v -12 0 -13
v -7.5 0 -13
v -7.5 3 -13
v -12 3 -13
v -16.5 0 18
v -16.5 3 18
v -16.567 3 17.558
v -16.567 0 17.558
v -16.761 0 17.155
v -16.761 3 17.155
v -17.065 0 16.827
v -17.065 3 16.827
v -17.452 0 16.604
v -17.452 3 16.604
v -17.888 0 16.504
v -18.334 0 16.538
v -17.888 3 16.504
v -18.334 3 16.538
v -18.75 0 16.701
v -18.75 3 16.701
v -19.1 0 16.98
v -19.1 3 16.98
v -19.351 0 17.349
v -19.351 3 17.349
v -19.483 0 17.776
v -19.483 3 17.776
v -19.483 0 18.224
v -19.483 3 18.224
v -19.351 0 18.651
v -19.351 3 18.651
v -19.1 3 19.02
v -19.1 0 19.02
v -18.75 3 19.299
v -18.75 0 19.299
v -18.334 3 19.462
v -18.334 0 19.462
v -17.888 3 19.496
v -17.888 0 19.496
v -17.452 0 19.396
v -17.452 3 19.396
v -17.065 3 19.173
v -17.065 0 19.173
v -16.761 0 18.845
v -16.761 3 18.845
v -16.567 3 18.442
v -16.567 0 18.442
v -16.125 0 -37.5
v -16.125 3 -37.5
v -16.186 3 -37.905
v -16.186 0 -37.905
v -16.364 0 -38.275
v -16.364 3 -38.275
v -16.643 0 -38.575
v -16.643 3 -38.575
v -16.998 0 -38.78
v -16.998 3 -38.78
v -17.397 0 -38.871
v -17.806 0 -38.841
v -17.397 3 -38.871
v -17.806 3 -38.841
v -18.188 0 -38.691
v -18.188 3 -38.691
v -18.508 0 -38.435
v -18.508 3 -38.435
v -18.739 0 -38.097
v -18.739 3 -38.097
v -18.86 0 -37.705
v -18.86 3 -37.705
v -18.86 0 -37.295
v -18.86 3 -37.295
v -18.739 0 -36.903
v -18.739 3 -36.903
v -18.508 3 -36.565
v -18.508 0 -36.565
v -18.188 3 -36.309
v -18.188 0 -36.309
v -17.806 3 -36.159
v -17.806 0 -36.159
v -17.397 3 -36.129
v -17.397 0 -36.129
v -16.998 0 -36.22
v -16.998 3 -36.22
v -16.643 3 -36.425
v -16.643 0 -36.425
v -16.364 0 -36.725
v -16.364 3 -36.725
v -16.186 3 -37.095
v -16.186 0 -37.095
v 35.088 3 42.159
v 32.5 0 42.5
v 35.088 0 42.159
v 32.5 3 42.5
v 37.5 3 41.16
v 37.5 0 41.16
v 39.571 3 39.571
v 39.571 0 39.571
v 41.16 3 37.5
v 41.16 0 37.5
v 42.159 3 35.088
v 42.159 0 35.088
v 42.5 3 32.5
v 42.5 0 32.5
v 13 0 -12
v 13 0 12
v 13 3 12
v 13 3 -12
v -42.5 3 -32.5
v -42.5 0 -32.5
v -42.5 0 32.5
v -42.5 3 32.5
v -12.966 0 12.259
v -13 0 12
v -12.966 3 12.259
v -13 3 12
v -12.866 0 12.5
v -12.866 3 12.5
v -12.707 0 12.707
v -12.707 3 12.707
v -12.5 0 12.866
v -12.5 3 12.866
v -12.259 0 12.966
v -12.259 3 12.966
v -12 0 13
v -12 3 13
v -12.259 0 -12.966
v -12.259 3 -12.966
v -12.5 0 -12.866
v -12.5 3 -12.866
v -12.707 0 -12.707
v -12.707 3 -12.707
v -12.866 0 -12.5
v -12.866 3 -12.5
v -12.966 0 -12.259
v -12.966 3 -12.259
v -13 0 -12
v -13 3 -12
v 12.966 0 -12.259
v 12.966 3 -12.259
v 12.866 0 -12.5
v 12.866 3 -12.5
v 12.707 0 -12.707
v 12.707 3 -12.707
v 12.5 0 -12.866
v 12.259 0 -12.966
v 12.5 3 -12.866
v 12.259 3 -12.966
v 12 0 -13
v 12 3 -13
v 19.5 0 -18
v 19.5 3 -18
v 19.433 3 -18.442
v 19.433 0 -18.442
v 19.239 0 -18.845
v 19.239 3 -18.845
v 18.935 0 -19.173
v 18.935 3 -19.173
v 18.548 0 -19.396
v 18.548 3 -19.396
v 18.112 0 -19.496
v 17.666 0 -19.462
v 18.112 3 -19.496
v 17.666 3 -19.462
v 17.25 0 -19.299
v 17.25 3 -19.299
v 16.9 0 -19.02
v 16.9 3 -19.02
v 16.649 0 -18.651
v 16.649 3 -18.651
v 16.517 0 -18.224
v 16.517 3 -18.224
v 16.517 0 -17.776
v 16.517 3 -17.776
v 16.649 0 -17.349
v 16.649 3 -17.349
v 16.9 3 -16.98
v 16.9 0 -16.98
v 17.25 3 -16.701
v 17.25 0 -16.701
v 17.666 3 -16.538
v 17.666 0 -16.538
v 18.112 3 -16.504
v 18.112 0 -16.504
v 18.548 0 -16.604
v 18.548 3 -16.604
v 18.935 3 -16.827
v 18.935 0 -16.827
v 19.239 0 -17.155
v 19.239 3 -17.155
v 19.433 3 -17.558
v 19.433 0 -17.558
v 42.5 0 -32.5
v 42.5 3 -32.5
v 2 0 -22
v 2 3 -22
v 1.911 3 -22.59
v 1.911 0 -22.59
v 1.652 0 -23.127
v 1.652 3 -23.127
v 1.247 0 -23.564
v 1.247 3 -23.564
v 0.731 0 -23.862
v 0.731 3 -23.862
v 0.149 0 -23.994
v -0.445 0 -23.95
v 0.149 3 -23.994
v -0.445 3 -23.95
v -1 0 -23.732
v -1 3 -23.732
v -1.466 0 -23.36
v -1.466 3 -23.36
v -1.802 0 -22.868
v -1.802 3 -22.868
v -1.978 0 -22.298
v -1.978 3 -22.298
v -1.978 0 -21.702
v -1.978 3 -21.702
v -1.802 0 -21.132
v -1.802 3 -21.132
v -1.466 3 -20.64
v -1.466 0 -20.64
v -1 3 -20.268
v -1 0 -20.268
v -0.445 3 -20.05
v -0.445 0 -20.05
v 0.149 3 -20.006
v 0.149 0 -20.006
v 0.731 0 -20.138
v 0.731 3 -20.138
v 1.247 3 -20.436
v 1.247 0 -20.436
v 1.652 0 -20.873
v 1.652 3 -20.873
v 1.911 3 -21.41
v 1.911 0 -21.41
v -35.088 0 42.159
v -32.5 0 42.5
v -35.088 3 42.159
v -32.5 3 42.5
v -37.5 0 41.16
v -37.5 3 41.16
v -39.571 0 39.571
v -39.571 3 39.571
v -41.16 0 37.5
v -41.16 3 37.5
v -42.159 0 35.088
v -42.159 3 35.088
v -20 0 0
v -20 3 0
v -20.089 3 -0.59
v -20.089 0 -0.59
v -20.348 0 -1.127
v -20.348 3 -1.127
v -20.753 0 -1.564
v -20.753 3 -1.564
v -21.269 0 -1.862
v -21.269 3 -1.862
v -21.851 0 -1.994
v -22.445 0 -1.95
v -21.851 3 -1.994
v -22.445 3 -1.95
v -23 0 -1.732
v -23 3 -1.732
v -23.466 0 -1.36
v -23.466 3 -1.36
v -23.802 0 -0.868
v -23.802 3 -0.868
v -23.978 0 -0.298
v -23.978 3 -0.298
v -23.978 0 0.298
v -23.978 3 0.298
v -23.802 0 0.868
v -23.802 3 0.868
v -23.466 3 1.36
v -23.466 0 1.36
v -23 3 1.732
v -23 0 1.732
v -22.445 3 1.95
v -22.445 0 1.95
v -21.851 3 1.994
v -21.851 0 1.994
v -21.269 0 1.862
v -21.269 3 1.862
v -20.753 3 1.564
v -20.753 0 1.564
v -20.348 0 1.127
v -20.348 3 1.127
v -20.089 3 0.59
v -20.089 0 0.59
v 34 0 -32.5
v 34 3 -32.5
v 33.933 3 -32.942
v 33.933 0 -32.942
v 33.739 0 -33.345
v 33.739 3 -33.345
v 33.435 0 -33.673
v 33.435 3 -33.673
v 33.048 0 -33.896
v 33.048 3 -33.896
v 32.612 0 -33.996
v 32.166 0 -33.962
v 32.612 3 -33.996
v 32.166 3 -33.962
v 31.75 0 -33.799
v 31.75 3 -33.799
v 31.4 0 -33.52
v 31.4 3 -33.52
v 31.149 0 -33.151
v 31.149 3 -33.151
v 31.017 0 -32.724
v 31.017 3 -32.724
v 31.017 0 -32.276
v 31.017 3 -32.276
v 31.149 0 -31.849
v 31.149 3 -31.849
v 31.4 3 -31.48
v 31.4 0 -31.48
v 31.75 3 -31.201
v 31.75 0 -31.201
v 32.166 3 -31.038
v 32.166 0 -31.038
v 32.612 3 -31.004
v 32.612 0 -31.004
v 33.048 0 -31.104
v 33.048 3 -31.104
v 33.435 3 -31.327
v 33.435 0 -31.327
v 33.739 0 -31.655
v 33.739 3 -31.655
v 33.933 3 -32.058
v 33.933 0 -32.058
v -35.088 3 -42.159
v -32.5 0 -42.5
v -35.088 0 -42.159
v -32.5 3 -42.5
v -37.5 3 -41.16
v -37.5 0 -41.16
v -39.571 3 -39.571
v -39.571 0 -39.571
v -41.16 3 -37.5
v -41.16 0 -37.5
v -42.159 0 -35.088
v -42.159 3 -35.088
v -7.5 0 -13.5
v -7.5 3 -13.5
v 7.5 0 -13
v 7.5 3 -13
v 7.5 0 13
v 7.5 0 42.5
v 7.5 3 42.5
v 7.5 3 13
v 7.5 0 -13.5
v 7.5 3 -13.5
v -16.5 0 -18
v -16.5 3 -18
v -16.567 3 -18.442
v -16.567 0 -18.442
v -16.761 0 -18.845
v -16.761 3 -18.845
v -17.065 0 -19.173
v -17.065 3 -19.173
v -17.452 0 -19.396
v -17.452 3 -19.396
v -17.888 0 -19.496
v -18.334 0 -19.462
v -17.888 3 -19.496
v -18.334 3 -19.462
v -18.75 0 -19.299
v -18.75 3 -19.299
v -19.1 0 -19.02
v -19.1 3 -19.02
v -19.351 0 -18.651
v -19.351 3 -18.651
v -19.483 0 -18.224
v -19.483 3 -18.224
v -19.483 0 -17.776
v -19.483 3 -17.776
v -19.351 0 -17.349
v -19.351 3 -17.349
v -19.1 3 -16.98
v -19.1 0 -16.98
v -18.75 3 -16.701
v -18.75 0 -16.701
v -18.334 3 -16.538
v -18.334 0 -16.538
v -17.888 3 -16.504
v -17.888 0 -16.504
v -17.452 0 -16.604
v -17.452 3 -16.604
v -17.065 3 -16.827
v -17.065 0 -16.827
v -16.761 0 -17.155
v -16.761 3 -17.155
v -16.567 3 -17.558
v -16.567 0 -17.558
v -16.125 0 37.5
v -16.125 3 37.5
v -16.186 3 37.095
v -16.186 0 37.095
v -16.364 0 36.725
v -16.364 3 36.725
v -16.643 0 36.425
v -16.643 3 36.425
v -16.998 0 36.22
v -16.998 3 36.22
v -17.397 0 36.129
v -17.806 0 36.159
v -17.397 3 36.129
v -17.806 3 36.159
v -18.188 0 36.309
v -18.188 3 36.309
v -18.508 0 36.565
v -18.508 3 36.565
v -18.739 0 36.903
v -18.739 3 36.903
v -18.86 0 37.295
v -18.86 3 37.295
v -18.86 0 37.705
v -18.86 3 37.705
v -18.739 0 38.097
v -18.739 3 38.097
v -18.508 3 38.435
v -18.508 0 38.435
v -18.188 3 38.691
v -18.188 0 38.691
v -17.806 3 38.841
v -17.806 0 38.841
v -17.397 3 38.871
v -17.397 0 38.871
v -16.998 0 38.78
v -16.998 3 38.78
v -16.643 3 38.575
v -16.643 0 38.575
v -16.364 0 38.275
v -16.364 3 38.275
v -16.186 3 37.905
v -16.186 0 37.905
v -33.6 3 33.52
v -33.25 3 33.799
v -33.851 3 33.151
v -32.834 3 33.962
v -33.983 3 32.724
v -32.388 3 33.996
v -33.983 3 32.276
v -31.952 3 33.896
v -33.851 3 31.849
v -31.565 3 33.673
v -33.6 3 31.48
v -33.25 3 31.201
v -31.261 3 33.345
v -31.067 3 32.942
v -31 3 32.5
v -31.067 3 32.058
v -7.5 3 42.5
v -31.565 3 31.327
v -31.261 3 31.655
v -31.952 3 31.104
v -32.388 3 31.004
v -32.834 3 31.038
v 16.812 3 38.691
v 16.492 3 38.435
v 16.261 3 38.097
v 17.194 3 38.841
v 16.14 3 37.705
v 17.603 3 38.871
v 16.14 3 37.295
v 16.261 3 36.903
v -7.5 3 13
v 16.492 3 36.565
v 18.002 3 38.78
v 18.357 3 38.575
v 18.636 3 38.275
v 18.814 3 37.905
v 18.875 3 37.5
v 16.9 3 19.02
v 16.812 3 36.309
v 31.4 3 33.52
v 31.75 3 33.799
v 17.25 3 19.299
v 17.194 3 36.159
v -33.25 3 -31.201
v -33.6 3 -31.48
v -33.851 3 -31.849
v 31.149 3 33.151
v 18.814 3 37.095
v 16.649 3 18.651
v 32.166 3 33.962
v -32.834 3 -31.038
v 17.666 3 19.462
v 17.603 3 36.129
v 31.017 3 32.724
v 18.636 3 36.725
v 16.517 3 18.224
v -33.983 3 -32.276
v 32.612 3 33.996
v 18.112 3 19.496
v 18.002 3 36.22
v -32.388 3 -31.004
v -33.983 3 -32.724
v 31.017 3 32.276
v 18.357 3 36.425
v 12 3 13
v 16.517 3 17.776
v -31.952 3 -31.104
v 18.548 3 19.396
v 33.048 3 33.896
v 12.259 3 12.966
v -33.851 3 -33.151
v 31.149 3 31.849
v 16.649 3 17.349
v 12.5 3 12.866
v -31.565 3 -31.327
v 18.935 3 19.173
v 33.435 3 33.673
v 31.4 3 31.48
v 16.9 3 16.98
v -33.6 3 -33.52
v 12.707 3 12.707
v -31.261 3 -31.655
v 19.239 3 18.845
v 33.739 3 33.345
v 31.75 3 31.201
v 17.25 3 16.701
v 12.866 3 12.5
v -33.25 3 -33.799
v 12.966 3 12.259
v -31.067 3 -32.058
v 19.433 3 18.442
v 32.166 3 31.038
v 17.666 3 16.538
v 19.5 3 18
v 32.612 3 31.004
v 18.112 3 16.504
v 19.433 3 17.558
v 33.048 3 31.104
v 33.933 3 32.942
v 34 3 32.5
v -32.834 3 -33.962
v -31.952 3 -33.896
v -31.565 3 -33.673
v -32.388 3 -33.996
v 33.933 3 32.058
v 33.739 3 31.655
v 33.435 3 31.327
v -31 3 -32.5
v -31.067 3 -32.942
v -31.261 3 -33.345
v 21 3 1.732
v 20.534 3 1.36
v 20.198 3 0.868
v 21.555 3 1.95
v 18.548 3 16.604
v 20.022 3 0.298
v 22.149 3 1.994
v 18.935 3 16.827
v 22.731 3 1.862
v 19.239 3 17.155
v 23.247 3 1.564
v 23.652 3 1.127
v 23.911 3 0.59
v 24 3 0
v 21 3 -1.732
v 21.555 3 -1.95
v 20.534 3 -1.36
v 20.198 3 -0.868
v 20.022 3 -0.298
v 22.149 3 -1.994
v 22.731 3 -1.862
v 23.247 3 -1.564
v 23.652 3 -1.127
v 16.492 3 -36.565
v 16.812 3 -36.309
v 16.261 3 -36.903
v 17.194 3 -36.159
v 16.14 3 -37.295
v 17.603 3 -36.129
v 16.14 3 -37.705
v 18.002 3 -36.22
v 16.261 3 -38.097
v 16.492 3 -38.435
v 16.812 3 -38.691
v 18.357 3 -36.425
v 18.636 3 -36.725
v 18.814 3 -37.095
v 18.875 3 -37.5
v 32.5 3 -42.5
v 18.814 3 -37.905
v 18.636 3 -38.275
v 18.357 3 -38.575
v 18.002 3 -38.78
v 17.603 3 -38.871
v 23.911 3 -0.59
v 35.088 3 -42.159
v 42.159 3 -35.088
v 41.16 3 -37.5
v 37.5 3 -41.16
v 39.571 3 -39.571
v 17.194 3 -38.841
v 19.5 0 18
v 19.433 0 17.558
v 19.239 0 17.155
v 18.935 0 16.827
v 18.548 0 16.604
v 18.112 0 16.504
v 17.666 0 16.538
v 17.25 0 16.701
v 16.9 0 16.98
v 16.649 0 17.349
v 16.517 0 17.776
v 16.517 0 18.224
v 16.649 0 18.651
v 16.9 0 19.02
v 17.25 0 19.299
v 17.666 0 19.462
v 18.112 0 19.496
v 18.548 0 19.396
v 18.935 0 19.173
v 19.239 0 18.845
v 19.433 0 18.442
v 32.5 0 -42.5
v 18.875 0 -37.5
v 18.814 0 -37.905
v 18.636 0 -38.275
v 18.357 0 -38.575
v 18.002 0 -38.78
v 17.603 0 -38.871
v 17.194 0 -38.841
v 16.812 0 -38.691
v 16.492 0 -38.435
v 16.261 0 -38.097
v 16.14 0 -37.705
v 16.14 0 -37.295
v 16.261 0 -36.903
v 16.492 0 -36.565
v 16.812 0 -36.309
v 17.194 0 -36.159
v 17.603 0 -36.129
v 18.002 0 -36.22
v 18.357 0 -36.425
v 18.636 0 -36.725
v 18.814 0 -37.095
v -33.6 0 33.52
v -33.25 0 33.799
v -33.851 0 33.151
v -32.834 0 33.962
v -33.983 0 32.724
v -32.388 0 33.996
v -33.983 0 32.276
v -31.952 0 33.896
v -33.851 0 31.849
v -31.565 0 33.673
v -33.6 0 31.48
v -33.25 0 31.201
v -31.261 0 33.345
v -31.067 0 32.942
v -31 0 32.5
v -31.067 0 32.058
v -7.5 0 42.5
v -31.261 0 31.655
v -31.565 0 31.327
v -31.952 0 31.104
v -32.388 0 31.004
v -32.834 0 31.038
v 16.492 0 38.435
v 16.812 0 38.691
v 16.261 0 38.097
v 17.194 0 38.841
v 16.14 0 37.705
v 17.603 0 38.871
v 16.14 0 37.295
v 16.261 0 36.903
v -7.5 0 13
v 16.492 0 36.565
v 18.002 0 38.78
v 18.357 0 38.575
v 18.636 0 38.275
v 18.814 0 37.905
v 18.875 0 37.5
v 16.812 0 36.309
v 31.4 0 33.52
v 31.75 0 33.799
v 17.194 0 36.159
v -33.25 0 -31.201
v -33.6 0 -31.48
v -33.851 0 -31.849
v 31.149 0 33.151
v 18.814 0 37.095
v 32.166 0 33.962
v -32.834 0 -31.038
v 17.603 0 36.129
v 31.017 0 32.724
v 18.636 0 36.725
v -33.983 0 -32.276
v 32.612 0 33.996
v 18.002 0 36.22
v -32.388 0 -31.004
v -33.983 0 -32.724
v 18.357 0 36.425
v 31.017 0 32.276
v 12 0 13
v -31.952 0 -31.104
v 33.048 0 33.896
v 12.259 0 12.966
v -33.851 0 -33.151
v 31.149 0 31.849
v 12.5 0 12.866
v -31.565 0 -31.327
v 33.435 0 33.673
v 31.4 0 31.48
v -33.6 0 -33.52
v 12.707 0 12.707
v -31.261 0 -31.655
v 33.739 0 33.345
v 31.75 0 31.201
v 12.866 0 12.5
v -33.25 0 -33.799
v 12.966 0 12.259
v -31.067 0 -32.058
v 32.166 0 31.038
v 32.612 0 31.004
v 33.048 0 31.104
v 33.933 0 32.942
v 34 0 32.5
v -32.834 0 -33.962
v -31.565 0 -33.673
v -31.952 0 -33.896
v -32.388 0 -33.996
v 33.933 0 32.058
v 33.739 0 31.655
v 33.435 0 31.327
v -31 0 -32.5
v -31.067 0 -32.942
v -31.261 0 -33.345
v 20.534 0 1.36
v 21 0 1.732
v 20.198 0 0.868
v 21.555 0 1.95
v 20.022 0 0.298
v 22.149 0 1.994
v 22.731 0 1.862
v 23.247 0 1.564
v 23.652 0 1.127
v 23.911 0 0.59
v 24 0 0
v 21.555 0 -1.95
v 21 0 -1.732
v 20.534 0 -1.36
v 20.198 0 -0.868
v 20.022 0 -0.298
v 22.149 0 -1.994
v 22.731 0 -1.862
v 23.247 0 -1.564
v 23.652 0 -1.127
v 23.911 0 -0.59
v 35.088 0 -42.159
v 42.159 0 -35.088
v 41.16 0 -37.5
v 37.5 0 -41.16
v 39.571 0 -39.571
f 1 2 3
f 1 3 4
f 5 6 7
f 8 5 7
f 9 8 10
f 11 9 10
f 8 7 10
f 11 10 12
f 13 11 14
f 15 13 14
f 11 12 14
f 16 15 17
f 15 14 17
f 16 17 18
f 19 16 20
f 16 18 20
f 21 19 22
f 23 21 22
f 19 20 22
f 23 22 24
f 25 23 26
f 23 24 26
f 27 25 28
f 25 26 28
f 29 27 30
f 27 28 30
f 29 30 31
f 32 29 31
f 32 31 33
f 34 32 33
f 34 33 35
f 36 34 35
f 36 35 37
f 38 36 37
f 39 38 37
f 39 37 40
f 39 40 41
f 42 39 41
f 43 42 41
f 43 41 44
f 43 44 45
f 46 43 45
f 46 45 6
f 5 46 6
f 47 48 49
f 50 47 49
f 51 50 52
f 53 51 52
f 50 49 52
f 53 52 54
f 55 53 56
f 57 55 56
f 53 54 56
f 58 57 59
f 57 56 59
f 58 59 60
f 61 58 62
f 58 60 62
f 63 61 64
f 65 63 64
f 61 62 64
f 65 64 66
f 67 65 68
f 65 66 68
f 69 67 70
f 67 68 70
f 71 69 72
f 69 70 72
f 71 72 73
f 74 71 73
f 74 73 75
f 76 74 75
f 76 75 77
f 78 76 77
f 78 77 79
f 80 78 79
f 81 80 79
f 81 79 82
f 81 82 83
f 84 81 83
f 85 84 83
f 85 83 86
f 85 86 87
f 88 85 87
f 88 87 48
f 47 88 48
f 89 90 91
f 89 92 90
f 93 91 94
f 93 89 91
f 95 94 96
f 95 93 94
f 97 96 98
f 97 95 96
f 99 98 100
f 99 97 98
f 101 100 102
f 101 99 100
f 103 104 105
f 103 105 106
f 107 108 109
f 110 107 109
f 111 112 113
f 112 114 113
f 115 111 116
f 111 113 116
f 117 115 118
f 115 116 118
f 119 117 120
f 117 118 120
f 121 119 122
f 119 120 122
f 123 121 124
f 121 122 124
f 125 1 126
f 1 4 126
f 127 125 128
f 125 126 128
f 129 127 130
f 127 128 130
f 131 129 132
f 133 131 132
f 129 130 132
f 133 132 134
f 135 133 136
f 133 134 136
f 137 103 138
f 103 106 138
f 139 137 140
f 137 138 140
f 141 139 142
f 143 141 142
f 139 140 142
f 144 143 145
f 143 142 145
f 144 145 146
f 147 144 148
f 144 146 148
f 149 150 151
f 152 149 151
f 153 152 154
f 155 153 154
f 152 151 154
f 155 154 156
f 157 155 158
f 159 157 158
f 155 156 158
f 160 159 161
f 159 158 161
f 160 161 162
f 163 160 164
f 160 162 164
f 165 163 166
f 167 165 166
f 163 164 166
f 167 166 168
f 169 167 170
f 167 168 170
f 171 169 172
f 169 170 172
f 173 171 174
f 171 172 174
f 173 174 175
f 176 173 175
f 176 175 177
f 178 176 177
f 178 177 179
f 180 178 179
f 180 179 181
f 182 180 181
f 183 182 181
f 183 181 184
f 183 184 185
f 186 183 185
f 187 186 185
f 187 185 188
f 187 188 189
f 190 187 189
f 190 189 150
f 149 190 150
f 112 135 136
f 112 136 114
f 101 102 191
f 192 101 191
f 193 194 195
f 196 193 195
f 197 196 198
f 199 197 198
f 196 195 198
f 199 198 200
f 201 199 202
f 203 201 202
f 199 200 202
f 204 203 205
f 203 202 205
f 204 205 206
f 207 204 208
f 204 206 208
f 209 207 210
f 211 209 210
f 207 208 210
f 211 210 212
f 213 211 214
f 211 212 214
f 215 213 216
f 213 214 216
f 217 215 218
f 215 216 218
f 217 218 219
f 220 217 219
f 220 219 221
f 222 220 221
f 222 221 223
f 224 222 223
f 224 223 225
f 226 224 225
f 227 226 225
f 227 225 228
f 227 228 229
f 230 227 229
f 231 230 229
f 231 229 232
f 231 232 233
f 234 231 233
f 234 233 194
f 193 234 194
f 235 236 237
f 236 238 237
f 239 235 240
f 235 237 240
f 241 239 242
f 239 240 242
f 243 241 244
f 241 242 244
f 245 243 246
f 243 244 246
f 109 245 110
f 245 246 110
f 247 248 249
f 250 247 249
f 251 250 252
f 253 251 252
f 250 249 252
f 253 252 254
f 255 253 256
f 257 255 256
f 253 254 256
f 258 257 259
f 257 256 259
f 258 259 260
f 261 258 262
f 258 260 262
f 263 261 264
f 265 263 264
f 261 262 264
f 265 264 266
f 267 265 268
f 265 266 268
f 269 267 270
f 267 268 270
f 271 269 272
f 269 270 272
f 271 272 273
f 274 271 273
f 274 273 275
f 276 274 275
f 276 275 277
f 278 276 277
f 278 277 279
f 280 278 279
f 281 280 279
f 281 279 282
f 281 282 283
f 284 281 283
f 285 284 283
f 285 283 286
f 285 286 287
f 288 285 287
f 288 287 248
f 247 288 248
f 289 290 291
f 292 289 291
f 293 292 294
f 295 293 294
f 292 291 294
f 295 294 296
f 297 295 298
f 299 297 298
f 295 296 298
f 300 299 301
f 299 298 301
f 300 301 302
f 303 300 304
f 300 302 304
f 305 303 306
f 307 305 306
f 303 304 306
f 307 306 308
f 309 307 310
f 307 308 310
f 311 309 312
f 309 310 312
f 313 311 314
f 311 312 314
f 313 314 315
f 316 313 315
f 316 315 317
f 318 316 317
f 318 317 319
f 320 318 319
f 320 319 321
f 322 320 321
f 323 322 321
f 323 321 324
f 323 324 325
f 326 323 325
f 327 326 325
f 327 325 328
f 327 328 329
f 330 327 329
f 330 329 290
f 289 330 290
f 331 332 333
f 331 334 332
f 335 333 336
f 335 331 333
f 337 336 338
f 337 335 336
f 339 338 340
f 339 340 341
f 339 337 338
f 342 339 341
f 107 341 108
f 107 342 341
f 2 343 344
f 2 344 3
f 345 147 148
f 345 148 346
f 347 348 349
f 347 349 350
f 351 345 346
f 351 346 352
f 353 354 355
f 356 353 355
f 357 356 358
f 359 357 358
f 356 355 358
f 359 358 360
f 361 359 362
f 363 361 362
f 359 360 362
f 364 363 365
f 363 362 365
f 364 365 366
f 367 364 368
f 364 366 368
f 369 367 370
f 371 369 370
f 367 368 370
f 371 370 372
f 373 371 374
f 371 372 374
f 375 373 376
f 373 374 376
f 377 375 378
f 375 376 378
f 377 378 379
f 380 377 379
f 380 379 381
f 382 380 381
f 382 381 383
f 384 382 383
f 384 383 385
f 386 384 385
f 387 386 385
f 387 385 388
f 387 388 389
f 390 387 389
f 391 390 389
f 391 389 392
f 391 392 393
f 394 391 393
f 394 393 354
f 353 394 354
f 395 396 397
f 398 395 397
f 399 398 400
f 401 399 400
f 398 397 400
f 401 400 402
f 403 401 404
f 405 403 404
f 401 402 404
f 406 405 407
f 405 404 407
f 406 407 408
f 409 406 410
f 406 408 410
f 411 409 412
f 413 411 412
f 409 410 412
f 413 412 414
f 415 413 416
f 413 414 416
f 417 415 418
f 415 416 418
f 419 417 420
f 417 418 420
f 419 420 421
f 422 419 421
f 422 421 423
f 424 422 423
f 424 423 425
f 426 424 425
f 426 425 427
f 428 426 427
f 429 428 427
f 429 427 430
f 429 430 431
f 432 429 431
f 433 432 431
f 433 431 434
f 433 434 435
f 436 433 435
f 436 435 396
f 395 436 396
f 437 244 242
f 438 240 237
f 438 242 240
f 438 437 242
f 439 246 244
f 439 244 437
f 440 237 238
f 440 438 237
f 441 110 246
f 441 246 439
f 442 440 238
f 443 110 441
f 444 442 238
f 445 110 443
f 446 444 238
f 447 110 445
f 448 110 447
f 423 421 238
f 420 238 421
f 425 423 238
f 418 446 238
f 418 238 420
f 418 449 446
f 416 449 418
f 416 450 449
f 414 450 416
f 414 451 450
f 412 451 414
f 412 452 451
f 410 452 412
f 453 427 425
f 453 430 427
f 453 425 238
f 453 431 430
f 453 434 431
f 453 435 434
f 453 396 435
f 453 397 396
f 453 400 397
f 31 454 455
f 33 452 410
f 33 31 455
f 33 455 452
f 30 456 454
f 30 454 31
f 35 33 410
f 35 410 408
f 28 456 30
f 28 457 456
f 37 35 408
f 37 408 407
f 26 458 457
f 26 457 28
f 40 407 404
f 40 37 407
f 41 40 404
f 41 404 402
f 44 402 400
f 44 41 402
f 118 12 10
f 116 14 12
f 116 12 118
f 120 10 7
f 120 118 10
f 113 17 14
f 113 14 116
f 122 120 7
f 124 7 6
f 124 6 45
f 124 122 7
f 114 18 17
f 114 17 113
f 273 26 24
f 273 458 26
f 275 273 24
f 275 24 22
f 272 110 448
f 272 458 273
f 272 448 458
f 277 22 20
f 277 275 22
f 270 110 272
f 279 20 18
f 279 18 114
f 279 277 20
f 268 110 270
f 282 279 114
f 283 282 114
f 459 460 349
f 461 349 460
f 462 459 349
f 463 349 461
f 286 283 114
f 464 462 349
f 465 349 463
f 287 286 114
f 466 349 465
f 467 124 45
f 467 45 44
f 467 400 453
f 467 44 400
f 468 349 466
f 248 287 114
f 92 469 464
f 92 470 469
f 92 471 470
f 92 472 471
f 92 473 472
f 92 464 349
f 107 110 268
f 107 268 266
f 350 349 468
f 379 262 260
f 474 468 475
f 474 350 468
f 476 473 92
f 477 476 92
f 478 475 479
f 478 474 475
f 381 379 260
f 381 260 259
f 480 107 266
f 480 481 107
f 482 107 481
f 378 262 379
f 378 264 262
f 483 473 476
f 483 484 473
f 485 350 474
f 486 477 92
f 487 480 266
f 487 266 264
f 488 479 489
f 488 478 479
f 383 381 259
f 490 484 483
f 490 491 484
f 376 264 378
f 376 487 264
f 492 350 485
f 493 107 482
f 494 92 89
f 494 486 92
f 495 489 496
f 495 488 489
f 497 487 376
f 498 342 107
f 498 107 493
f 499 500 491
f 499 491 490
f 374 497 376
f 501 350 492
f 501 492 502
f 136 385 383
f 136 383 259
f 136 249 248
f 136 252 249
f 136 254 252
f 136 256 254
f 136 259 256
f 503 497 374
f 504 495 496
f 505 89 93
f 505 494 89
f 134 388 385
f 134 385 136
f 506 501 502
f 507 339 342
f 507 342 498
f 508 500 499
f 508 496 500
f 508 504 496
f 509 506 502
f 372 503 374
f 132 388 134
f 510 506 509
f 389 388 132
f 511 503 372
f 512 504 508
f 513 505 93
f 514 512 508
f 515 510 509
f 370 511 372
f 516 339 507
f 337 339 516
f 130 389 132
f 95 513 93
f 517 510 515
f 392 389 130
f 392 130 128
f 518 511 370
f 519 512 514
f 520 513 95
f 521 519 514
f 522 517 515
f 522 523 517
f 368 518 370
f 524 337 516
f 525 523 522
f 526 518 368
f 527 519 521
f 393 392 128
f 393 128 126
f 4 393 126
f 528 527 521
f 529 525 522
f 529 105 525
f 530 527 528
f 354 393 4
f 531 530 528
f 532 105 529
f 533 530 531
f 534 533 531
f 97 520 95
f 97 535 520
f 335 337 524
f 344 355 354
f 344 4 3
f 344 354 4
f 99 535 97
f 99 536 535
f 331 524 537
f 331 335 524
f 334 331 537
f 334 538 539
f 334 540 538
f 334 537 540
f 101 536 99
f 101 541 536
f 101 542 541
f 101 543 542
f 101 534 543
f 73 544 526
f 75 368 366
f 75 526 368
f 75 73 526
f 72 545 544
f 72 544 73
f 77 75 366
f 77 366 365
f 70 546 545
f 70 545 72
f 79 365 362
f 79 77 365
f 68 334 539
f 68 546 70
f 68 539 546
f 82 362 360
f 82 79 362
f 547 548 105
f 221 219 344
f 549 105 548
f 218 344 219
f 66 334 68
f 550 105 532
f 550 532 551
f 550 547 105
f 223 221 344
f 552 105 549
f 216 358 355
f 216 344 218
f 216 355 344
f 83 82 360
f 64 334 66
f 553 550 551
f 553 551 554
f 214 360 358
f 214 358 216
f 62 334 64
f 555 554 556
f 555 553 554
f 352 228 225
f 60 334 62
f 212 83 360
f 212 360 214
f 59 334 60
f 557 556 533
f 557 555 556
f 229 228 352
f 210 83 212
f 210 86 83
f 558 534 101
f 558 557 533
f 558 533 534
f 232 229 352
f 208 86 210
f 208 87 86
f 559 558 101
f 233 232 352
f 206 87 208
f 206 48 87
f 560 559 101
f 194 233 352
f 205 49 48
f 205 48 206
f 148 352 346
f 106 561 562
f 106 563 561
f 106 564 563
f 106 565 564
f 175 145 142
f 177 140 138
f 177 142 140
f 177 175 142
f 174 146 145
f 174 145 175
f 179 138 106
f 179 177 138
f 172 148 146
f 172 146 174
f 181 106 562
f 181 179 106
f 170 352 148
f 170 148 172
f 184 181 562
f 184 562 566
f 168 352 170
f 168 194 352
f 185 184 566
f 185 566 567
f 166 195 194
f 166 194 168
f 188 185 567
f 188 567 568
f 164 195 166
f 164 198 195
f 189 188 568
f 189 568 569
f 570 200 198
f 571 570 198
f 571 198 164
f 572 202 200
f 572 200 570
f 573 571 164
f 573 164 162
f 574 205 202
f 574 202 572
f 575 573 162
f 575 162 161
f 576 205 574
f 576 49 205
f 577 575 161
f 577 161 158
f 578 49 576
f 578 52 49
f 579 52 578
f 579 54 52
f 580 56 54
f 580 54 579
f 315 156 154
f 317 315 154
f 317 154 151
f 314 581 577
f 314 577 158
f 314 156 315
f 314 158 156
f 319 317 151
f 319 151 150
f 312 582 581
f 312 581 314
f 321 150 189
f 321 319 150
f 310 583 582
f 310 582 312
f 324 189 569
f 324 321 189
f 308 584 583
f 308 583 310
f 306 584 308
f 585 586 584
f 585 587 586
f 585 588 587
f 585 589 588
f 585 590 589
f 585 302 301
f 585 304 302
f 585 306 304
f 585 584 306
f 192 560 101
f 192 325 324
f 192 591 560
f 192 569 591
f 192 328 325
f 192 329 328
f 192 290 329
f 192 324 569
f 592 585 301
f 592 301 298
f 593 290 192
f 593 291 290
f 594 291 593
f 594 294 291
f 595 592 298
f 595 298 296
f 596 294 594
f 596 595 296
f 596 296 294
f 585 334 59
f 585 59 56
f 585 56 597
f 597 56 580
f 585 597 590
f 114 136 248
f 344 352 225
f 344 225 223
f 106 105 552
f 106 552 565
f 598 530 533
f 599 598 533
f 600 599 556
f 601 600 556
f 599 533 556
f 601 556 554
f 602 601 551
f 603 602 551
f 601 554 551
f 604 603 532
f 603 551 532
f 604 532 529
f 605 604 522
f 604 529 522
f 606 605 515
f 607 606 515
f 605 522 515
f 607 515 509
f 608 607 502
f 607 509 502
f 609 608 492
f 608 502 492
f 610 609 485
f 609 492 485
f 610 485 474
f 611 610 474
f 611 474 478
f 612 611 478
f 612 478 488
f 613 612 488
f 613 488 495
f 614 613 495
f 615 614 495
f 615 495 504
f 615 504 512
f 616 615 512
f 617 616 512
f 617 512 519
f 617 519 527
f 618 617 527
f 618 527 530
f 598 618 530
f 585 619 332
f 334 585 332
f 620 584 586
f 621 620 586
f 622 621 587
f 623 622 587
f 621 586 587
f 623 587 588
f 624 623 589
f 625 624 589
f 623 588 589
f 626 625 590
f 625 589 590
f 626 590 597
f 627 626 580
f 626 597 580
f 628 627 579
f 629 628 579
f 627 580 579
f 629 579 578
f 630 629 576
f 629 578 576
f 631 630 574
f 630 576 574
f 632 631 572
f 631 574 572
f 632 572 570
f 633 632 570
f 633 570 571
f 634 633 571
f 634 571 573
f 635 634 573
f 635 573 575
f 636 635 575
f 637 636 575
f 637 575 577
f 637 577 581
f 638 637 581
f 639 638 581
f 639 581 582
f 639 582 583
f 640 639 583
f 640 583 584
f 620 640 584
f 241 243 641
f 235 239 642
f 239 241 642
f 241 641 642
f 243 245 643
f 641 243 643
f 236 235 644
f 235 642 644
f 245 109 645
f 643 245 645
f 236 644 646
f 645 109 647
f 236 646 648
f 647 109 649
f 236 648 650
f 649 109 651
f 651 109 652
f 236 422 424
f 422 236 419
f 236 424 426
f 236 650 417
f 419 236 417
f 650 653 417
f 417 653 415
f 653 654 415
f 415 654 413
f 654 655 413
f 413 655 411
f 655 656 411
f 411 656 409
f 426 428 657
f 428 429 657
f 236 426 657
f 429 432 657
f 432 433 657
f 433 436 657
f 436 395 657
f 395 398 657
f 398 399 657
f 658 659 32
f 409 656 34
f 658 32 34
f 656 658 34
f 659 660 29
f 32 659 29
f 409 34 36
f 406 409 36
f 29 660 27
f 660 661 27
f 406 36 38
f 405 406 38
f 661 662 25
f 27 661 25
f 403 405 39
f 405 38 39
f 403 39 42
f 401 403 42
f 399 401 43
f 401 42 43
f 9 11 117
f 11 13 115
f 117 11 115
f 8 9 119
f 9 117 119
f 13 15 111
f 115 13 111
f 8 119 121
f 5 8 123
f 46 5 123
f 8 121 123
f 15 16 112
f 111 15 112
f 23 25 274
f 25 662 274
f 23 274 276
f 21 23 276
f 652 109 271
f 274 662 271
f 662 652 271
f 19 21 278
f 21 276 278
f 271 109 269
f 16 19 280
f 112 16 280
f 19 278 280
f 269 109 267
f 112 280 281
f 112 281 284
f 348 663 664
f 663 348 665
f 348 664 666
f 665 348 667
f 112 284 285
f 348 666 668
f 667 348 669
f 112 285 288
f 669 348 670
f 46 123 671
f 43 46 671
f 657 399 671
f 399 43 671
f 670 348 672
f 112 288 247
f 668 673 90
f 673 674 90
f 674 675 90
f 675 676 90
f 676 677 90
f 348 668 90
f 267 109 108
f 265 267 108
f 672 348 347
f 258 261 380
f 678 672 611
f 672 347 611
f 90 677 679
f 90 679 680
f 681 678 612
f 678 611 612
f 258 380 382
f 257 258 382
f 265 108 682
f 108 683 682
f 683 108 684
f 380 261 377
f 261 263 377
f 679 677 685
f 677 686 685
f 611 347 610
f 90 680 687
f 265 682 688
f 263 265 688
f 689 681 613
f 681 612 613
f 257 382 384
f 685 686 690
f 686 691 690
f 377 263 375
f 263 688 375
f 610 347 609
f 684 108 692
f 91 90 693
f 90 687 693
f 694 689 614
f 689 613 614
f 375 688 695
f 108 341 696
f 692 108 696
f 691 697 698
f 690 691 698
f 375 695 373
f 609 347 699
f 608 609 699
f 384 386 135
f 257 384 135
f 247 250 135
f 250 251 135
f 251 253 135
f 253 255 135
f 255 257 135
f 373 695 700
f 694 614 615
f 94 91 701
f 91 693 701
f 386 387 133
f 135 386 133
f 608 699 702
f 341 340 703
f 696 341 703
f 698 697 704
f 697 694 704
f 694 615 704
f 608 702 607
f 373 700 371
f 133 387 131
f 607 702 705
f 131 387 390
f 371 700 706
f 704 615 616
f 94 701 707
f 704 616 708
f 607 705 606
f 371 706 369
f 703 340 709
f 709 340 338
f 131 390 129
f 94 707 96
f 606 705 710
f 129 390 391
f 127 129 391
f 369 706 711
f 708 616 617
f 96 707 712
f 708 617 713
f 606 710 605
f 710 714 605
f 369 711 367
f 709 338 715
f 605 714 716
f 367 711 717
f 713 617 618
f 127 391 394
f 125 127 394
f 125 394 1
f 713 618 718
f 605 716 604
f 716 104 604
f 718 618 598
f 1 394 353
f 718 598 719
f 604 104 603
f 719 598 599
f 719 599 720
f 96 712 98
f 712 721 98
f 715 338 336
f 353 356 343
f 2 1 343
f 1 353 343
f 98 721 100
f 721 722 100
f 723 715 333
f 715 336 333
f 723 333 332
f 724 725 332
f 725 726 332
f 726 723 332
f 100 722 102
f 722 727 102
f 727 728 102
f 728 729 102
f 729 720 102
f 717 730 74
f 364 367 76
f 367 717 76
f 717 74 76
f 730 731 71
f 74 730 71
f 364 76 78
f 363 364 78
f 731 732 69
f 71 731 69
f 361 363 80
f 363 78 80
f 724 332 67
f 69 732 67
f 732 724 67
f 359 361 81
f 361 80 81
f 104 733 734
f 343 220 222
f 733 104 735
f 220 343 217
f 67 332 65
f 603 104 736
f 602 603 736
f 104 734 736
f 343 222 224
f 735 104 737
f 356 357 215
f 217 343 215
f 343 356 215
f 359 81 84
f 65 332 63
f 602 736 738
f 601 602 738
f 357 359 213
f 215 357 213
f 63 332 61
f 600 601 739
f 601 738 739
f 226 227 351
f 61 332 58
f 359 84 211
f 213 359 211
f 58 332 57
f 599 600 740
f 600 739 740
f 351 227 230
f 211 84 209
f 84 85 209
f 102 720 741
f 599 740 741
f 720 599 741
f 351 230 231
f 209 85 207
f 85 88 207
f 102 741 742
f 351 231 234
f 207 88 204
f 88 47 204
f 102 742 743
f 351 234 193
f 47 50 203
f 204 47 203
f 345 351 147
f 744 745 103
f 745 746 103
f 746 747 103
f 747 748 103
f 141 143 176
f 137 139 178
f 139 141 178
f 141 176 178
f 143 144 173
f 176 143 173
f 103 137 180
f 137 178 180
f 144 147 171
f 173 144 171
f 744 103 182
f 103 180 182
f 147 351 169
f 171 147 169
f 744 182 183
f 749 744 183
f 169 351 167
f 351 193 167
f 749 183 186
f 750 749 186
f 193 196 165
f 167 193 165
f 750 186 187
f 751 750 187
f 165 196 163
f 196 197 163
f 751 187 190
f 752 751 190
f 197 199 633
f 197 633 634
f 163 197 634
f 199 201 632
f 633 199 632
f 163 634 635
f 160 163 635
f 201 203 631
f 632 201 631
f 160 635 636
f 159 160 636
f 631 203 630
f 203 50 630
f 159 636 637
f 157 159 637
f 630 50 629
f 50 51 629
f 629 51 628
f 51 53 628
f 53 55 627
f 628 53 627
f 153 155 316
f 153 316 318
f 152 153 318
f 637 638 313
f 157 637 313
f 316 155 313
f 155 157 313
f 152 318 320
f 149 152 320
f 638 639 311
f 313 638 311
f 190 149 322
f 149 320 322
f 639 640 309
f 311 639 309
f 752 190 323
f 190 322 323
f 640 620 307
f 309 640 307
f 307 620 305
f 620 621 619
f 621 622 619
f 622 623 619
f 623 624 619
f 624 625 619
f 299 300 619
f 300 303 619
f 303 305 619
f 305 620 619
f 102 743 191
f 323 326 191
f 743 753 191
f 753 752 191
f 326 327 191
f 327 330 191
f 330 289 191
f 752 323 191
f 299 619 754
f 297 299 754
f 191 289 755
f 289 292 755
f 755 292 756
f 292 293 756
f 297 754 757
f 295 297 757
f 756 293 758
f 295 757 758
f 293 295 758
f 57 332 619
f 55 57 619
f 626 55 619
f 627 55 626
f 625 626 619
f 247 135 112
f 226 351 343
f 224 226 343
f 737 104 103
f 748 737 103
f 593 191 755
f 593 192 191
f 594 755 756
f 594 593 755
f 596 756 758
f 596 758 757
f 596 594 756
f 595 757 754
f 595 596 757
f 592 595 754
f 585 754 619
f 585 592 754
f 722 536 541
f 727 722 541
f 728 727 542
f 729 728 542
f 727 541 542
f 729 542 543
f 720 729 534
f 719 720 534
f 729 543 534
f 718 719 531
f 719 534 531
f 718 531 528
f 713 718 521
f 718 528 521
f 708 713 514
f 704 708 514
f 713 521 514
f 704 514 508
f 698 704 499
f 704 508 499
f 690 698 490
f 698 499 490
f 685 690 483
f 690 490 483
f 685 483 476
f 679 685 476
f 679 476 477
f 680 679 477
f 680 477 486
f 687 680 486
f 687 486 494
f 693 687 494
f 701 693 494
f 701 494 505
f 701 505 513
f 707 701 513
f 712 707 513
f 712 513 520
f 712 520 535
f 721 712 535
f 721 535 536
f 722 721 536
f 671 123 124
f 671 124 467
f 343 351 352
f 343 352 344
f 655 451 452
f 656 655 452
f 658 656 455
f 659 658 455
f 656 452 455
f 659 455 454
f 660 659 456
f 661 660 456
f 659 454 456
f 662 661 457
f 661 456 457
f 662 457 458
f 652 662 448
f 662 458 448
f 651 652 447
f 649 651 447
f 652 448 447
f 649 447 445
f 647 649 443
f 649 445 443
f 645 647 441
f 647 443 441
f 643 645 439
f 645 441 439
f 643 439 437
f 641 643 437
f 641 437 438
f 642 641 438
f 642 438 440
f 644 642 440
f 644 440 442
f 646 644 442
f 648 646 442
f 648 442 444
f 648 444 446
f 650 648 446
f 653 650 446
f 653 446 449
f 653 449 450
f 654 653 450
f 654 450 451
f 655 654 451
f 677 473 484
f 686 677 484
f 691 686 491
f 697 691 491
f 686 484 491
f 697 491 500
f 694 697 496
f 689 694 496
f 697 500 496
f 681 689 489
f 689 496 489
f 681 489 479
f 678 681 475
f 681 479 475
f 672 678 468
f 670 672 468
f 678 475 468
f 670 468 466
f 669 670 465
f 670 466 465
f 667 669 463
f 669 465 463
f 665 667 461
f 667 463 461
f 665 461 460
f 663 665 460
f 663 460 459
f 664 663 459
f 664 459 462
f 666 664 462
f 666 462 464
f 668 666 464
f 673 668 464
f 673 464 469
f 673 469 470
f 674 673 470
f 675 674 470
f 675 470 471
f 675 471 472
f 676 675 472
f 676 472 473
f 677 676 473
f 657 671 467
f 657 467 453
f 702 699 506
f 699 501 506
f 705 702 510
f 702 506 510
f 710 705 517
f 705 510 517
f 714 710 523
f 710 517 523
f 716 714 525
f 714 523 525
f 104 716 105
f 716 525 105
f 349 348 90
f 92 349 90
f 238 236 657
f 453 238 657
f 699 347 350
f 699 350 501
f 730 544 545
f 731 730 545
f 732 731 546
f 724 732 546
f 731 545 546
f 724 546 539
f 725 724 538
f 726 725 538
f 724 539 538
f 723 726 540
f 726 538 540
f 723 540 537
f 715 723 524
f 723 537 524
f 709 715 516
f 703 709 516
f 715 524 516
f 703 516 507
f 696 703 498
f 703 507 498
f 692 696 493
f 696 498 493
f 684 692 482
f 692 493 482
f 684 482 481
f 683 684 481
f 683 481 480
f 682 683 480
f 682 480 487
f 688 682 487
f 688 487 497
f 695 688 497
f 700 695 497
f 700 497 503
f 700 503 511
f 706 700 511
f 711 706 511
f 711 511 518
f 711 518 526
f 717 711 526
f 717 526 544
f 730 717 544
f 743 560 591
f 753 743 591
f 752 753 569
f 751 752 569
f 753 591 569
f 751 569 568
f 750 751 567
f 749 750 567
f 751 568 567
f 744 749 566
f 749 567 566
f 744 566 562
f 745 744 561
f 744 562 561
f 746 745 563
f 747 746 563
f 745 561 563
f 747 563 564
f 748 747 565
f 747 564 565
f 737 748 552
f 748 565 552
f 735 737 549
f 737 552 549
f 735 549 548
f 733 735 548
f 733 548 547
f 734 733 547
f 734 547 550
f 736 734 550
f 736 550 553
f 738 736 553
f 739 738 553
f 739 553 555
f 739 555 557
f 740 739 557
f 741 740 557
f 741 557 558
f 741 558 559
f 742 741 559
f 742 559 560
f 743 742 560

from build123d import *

# Parameters (mm, degrees)
BOSS_EXTRUDE1_DEPTH = 3
FILLET1_R           = 10
CUT_EXTRUDE1_REACH  = 5
SKETCH2_R           = 1.5
SKETCH2_R_2         = 1.375
SKETCH2_R_3         = 2
CUT_EXTRUDE2_REACH  = 5
FILLET2_R           = 1


with BuildPart() as part:
    # Sketch1 → Boss-Extrude1 (new body)
    with BuildSketch(Plane(origin=(0, 0, 0), x_dir=(1, 0, 0), z_dir=(0, 1, 0))):
        Polygon((-42.5, -42.5), (42.5, -42.5), (42.5, -25), (42.5, 25), (42.5, 42.5), (-42.5, 42.5), align=None)
    extrude(amount=BOSS_EXTRUDE1_DEPTH)

    # Fillet1
    fillet1_edges = [part.edges().sort_by_distance(p)[0] for p in [
        (42.5, 1.5, 42.5),
        (-42.5, 1.5, 42.5),
        (-42.5, 1.5, -42.5),
        (42.5, 1.5, -42.5),
    ]]
    fillet(fillet1_edges, radius=FILLET1_R)

    # Sketch2 → Cut-Extrude1 (cut, up to next)
    with BuildSketch(Plane(origin=(0, 3, 0), x_dir=(1, 0, 0), z_dir=(0, 1, 0)), mode=Mode.PRIVATE) as cut_extrude1_sk1:
        with Locations((-32.5, 32.5)):
            Circle(SKETCH2_R)
    cut_extrude1_tool1 = extrude(cut_extrude1_sk1.sketch, amount=-CUT_EXTRUDE1_REACH, mode=Mode.PRIVATE) & part.part
    add(cut_extrude1_tool1.solids().sort_by_distance((-32.5, 3, -32.5))[0], mode=Mode.SUBTRACT)
    # Sketch2 → Cut-Extrude1 (cut, up to next)
    with BuildSketch(Plane(origin=(0, 3, 0), x_dir=(1, 0, 0), z_dir=(0, 1, 0)), mode=Mode.PRIVATE) as cut_extrude1_sk2:
        with Locations((32.5, 32.5)):
            Circle(SKETCH2_R)
    cut_extrude1_tool2 = extrude(cut_extrude1_sk2.sketch, amount=-CUT_EXTRUDE1_REACH, mode=Mode.PRIVATE) & part.part
    add(cut_extrude1_tool2.solids().sort_by_distance((32.5, 3, -32.5))[0], mode=Mode.SUBTRACT)
    # Sketch2 → Cut-Extrude1 (cut, up to next)
    with BuildSketch(Plane(origin=(0, 3, 0), x_dir=(1, 0, 0), z_dir=(0, 1, 0)), mode=Mode.PRIVATE) as cut_extrude1_sk3:
        with Locations((32.5, -32.5)):
            Circle(SKETCH2_R)
    cut_extrude1_tool3 = extrude(cut_extrude1_sk3.sketch, amount=-CUT_EXTRUDE1_REACH, mode=Mode.PRIVATE) & part.part
    add(cut_extrude1_tool3.solids().sort_by_distance((32.5, 3, 32.5))[0], mode=Mode.SUBTRACT)
    # Sketch2 → Cut-Extrude1 (cut, up to next)
    with BuildSketch(Plane(origin=(0, 3, 0), x_dir=(1, 0, 0), z_dir=(0, 1, 0)), mode=Mode.PRIVATE) as cut_extrude1_sk4:
        with Locations((-32.5, -32.5)):
            Circle(SKETCH2_R)
    cut_extrude1_tool4 = extrude(cut_extrude1_sk4.sketch, amount=-CUT_EXTRUDE1_REACH, mode=Mode.PRIVATE) & part.part
    add(cut_extrude1_tool4.solids().sort_by_distance((-32.5, 3, 32.5))[0], mode=Mode.SUBTRACT)
    # Sketch2 → Cut-Extrude1 (cut, up to next)
    with BuildSketch(Plane(origin=(0, 3, 0), x_dir=(1, 0, 0), z_dir=(0, 1, 0)), mode=Mode.PRIVATE) as cut_extrude1_sk5:
        with Locations((-17.5, -37.5)):
            Circle(SKETCH2_R_2)
    cut_extrude1_tool5 = extrude(cut_extrude1_sk5.sketch, amount=-CUT_EXTRUDE1_REACH, mode=Mode.PRIVATE) & part.part
    add(cut_extrude1_tool5.solids().sort_by_distance((-17.5, 3, 37.5))[0], mode=Mode.SUBTRACT)
    # Sketch2 → Cut-Extrude1 (cut, up to next)
    with BuildSketch(Plane(origin=(0, 3, 0), x_dir=(1, 0, 0), z_dir=(0, 1, 0)), mode=Mode.PRIVATE) as cut_extrude1_sk6:
        with Locations((17.5, -37.5)):
            Circle(SKETCH2_R_2)
    cut_extrude1_tool6 = extrude(cut_extrude1_sk6.sketch, amount=-CUT_EXTRUDE1_REACH, mode=Mode.PRIVATE) & part.part
    add(cut_extrude1_tool6.solids().sort_by_distance((17.5, 3, 37.5))[0], mode=Mode.SUBTRACT)
    # Sketch2 → Cut-Extrude1 (cut, up to next)
    with BuildSketch(Plane(origin=(0, 3, 0), x_dir=(1, 0, 0), z_dir=(0, 1, 0)), mode=Mode.PRIVATE) as cut_extrude1_sk7:
        with Locations((-18, 18)):
            Circle(SKETCH2_R)
    cut_extrude1_tool7 = extrude(cut_extrude1_sk7.sketch, amount=-CUT_EXTRUDE1_REACH, mode=Mode.PRIVATE) & part.part
    add(cut_extrude1_tool7.solids().sort_by_distance((-18, 3, -18))[0], mode=Mode.SUBTRACT)
    # Sketch2 → Cut-Extrude1 (cut, up to next)
    with BuildSketch(Plane(origin=(0, 3, 0), x_dir=(1, 0, 0), z_dir=(0, 1, 0)), mode=Mode.PRIVATE) as cut_extrude1_sk8:
        with Locations((-17.5, 37.5)):
            Circle(SKETCH2_R_2)
    cut_extrude1_tool8 = extrude(cut_extrude1_sk8.sketch, amount=-CUT_EXTRUDE1_REACH, mode=Mode.PRIVATE) & part.part
    add(cut_extrude1_tool8.solids().sort_by_distance((-17.5, 3, -37.5))[0], mode=Mode.SUBTRACT)
    # Sketch2 → Cut-Extrude1 (cut, up to next)
    with BuildSketch(Plane(origin=(0, 3, 0), x_dir=(1, 0, 0), z_dir=(0, 1, 0)), mode=Mode.PRIVATE) as cut_extrude1_sk9:
        with Locations((17.5, 37.5)):
            Circle(SKETCH2_R_2)
    cut_extrude1_tool9 = extrude(cut_extrude1_sk9.sketch, amount=-CUT_EXTRUDE1_REACH, mode=Mode.PRIVATE) & part.part
    add(cut_extrude1_tool9.solids().sort_by_distance((17.5, 3, -37.5))[0], mode=Mode.SUBTRACT)
    # Sketch2 → Cut-Extrude1 (cut, up to next)
    with BuildSketch(Plane(origin=(0, 3, 0), x_dir=(1, 0, 0), z_dir=(0, 1, 0)), mode=Mode.PRIVATE) as cut_extrude1_sk10:
        with Locations((18, 18)):
            Circle(SKETCH2_R)
    cut_extrude1_tool10 = extrude(cut_extrude1_sk10.sketch, amount=-CUT_EXTRUDE1_REACH, mode=Mode.PRIVATE) & part.part
    add(cut_extrude1_tool10.solids().sort_by_distance((18, 3, -18))[0], mode=Mode.SUBTRACT)
    # Sketch2 → Cut-Extrude1 (cut, up to next)
    with BuildSketch(Plane(origin=(0, 3, 0), x_dir=(1, 0, 0), z_dir=(0, 1, 0)), mode=Mode.PRIVATE) as cut_extrude1_sk11:
        with Locations((18, -18)):
            Circle(SKETCH2_R)
    cut_extrude1_tool11 = extrude(cut_extrude1_sk11.sketch, amount=-CUT_EXTRUDE1_REACH, mode=Mode.PRIVATE) & part.part
    add(cut_extrude1_tool11.solids().sort_by_distance((18, 3, 18))[0], mode=Mode.SUBTRACT)
    # Sketch2 → Cut-Extrude1 (cut, up to next)
    with BuildSketch(Plane(origin=(0, 3, 0), x_dir=(1, 0, 0), z_dir=(0, 1, 0)), mode=Mode.PRIVATE) as cut_extrude1_sk12:
        with Locations((-18, -18)):
            Circle(SKETCH2_R)
    cut_extrude1_tool12 = extrude(cut_extrude1_sk12.sketch, amount=-CUT_EXTRUDE1_REACH, mode=Mode.PRIVATE) & part.part
    add(cut_extrude1_tool12.solids().sort_by_distance((-18, 3, 18))[0], mode=Mode.SUBTRACT)
    # Sketch2 → Cut-Extrude1 (cut, up to next)
    with BuildSketch(Plane(origin=(0, 3, 0), x_dir=(1, 0, 0), z_dir=(0, 1, 0)), mode=Mode.PRIVATE) as cut_extrude1_sk13:
        with Locations((-22, 0)):
            Circle(SKETCH2_R_3)
    cut_extrude1_tool13 = extrude(cut_extrude1_sk13.sketch, amount=-CUT_EXTRUDE1_REACH, mode=Mode.PRIVATE) & part.part
    add(cut_extrude1_tool13.solids().sort_by_distance((-22, 3, 0))[0], mode=Mode.SUBTRACT)
    # Sketch2 → Cut-Extrude1 (cut, up to next)
    with BuildSketch(Plane(origin=(0, 3, 0), x_dir=(1, 0, 0), z_dir=(0, 1, 0)), mode=Mode.PRIVATE) as cut_extrude1_sk14:
        with Locations((0, 22)):
            Circle(SKETCH2_R_3)
    cut_extrude1_tool14 = extrude(cut_extrude1_sk14.sketch, amount=-CUT_EXTRUDE1_REACH, mode=Mode.PRIVATE) & part.part
    add(cut_extrude1_tool14.solids().sort_by_distance((0, 3, -22))[0], mode=Mode.SUBTRACT)
    # Sketch2 → Cut-Extrude1 (cut, up to next)
    with BuildSketch(Plane(origin=(0, 3, 0), x_dir=(1, 0, 0), z_dir=(0, 1, 0)), mode=Mode.PRIVATE) as cut_extrude1_sk15:
        with Locations((22, 0)):
            Circle(SKETCH2_R_3)
    cut_extrude1_tool15 = extrude(cut_extrude1_sk15.sketch, amount=-CUT_EXTRUDE1_REACH, mode=Mode.PRIVATE) & part.part
    add(cut_extrude1_tool15.solids().sort_by_distance((22, 3, 0))[0], mode=Mode.SUBTRACT)
    # Sketch2 → Cut-Extrude1 (cut, up to next)
    with BuildSketch(Plane(origin=(0, 3, 0), x_dir=(1, 0, 0), z_dir=(0, 1, 0)), mode=Mode.PRIVATE) as cut_extrude1_sk16:
        with Locations((0, -22)):
            Circle(SKETCH2_R_3)
    cut_extrude1_tool16 = extrude(cut_extrude1_sk16.sketch, amount=-CUT_EXTRUDE1_REACH, mode=Mode.PRIVATE) & part.part
    add(cut_extrude1_tool16.solids().sort_by_distance((0, 3, 22))[0], mode=Mode.SUBTRACT)

    # Sketch3 → Cut-Extrude2 (cut, up to next)
    with BuildSketch(Plane.XZ, mode=Mode.PRIVATE) as cut_extrude2_sk1:
        Polygon((7.5, -13.5), (-7.5, -13.5), (-7.5, -13), (-13, -13), (-13, 13), (-7.5, 13), (-7.5, 42.5), (7.5, 42.5), (7.5, 13), (13, 13), (13, -13), (7.5, -13), align=None)
    cut_extrude2_tool1 = extrude(cut_extrude2_sk1.sketch, amount=-CUT_EXTRUDE2_REACH, mode=Mode.PRIVATE) & part.part
    add(cut_extrude2_tool1.solids().sort_by_distance((0, 0, 10.817052))[0], mode=Mode.SUBTRACT)

    # Fillet2
    fillet2_edges = [part.edges().sort_by_distance(p)[0] for p in [
        (13, 1.5, 13),
        (13, 1.5, -13),
        (-13, 1.5, -13),
        (-13, 1.5, 13),
    ]]
    fillet(fillet2_edges, radius=FILLET2_R)


solid = part.part
